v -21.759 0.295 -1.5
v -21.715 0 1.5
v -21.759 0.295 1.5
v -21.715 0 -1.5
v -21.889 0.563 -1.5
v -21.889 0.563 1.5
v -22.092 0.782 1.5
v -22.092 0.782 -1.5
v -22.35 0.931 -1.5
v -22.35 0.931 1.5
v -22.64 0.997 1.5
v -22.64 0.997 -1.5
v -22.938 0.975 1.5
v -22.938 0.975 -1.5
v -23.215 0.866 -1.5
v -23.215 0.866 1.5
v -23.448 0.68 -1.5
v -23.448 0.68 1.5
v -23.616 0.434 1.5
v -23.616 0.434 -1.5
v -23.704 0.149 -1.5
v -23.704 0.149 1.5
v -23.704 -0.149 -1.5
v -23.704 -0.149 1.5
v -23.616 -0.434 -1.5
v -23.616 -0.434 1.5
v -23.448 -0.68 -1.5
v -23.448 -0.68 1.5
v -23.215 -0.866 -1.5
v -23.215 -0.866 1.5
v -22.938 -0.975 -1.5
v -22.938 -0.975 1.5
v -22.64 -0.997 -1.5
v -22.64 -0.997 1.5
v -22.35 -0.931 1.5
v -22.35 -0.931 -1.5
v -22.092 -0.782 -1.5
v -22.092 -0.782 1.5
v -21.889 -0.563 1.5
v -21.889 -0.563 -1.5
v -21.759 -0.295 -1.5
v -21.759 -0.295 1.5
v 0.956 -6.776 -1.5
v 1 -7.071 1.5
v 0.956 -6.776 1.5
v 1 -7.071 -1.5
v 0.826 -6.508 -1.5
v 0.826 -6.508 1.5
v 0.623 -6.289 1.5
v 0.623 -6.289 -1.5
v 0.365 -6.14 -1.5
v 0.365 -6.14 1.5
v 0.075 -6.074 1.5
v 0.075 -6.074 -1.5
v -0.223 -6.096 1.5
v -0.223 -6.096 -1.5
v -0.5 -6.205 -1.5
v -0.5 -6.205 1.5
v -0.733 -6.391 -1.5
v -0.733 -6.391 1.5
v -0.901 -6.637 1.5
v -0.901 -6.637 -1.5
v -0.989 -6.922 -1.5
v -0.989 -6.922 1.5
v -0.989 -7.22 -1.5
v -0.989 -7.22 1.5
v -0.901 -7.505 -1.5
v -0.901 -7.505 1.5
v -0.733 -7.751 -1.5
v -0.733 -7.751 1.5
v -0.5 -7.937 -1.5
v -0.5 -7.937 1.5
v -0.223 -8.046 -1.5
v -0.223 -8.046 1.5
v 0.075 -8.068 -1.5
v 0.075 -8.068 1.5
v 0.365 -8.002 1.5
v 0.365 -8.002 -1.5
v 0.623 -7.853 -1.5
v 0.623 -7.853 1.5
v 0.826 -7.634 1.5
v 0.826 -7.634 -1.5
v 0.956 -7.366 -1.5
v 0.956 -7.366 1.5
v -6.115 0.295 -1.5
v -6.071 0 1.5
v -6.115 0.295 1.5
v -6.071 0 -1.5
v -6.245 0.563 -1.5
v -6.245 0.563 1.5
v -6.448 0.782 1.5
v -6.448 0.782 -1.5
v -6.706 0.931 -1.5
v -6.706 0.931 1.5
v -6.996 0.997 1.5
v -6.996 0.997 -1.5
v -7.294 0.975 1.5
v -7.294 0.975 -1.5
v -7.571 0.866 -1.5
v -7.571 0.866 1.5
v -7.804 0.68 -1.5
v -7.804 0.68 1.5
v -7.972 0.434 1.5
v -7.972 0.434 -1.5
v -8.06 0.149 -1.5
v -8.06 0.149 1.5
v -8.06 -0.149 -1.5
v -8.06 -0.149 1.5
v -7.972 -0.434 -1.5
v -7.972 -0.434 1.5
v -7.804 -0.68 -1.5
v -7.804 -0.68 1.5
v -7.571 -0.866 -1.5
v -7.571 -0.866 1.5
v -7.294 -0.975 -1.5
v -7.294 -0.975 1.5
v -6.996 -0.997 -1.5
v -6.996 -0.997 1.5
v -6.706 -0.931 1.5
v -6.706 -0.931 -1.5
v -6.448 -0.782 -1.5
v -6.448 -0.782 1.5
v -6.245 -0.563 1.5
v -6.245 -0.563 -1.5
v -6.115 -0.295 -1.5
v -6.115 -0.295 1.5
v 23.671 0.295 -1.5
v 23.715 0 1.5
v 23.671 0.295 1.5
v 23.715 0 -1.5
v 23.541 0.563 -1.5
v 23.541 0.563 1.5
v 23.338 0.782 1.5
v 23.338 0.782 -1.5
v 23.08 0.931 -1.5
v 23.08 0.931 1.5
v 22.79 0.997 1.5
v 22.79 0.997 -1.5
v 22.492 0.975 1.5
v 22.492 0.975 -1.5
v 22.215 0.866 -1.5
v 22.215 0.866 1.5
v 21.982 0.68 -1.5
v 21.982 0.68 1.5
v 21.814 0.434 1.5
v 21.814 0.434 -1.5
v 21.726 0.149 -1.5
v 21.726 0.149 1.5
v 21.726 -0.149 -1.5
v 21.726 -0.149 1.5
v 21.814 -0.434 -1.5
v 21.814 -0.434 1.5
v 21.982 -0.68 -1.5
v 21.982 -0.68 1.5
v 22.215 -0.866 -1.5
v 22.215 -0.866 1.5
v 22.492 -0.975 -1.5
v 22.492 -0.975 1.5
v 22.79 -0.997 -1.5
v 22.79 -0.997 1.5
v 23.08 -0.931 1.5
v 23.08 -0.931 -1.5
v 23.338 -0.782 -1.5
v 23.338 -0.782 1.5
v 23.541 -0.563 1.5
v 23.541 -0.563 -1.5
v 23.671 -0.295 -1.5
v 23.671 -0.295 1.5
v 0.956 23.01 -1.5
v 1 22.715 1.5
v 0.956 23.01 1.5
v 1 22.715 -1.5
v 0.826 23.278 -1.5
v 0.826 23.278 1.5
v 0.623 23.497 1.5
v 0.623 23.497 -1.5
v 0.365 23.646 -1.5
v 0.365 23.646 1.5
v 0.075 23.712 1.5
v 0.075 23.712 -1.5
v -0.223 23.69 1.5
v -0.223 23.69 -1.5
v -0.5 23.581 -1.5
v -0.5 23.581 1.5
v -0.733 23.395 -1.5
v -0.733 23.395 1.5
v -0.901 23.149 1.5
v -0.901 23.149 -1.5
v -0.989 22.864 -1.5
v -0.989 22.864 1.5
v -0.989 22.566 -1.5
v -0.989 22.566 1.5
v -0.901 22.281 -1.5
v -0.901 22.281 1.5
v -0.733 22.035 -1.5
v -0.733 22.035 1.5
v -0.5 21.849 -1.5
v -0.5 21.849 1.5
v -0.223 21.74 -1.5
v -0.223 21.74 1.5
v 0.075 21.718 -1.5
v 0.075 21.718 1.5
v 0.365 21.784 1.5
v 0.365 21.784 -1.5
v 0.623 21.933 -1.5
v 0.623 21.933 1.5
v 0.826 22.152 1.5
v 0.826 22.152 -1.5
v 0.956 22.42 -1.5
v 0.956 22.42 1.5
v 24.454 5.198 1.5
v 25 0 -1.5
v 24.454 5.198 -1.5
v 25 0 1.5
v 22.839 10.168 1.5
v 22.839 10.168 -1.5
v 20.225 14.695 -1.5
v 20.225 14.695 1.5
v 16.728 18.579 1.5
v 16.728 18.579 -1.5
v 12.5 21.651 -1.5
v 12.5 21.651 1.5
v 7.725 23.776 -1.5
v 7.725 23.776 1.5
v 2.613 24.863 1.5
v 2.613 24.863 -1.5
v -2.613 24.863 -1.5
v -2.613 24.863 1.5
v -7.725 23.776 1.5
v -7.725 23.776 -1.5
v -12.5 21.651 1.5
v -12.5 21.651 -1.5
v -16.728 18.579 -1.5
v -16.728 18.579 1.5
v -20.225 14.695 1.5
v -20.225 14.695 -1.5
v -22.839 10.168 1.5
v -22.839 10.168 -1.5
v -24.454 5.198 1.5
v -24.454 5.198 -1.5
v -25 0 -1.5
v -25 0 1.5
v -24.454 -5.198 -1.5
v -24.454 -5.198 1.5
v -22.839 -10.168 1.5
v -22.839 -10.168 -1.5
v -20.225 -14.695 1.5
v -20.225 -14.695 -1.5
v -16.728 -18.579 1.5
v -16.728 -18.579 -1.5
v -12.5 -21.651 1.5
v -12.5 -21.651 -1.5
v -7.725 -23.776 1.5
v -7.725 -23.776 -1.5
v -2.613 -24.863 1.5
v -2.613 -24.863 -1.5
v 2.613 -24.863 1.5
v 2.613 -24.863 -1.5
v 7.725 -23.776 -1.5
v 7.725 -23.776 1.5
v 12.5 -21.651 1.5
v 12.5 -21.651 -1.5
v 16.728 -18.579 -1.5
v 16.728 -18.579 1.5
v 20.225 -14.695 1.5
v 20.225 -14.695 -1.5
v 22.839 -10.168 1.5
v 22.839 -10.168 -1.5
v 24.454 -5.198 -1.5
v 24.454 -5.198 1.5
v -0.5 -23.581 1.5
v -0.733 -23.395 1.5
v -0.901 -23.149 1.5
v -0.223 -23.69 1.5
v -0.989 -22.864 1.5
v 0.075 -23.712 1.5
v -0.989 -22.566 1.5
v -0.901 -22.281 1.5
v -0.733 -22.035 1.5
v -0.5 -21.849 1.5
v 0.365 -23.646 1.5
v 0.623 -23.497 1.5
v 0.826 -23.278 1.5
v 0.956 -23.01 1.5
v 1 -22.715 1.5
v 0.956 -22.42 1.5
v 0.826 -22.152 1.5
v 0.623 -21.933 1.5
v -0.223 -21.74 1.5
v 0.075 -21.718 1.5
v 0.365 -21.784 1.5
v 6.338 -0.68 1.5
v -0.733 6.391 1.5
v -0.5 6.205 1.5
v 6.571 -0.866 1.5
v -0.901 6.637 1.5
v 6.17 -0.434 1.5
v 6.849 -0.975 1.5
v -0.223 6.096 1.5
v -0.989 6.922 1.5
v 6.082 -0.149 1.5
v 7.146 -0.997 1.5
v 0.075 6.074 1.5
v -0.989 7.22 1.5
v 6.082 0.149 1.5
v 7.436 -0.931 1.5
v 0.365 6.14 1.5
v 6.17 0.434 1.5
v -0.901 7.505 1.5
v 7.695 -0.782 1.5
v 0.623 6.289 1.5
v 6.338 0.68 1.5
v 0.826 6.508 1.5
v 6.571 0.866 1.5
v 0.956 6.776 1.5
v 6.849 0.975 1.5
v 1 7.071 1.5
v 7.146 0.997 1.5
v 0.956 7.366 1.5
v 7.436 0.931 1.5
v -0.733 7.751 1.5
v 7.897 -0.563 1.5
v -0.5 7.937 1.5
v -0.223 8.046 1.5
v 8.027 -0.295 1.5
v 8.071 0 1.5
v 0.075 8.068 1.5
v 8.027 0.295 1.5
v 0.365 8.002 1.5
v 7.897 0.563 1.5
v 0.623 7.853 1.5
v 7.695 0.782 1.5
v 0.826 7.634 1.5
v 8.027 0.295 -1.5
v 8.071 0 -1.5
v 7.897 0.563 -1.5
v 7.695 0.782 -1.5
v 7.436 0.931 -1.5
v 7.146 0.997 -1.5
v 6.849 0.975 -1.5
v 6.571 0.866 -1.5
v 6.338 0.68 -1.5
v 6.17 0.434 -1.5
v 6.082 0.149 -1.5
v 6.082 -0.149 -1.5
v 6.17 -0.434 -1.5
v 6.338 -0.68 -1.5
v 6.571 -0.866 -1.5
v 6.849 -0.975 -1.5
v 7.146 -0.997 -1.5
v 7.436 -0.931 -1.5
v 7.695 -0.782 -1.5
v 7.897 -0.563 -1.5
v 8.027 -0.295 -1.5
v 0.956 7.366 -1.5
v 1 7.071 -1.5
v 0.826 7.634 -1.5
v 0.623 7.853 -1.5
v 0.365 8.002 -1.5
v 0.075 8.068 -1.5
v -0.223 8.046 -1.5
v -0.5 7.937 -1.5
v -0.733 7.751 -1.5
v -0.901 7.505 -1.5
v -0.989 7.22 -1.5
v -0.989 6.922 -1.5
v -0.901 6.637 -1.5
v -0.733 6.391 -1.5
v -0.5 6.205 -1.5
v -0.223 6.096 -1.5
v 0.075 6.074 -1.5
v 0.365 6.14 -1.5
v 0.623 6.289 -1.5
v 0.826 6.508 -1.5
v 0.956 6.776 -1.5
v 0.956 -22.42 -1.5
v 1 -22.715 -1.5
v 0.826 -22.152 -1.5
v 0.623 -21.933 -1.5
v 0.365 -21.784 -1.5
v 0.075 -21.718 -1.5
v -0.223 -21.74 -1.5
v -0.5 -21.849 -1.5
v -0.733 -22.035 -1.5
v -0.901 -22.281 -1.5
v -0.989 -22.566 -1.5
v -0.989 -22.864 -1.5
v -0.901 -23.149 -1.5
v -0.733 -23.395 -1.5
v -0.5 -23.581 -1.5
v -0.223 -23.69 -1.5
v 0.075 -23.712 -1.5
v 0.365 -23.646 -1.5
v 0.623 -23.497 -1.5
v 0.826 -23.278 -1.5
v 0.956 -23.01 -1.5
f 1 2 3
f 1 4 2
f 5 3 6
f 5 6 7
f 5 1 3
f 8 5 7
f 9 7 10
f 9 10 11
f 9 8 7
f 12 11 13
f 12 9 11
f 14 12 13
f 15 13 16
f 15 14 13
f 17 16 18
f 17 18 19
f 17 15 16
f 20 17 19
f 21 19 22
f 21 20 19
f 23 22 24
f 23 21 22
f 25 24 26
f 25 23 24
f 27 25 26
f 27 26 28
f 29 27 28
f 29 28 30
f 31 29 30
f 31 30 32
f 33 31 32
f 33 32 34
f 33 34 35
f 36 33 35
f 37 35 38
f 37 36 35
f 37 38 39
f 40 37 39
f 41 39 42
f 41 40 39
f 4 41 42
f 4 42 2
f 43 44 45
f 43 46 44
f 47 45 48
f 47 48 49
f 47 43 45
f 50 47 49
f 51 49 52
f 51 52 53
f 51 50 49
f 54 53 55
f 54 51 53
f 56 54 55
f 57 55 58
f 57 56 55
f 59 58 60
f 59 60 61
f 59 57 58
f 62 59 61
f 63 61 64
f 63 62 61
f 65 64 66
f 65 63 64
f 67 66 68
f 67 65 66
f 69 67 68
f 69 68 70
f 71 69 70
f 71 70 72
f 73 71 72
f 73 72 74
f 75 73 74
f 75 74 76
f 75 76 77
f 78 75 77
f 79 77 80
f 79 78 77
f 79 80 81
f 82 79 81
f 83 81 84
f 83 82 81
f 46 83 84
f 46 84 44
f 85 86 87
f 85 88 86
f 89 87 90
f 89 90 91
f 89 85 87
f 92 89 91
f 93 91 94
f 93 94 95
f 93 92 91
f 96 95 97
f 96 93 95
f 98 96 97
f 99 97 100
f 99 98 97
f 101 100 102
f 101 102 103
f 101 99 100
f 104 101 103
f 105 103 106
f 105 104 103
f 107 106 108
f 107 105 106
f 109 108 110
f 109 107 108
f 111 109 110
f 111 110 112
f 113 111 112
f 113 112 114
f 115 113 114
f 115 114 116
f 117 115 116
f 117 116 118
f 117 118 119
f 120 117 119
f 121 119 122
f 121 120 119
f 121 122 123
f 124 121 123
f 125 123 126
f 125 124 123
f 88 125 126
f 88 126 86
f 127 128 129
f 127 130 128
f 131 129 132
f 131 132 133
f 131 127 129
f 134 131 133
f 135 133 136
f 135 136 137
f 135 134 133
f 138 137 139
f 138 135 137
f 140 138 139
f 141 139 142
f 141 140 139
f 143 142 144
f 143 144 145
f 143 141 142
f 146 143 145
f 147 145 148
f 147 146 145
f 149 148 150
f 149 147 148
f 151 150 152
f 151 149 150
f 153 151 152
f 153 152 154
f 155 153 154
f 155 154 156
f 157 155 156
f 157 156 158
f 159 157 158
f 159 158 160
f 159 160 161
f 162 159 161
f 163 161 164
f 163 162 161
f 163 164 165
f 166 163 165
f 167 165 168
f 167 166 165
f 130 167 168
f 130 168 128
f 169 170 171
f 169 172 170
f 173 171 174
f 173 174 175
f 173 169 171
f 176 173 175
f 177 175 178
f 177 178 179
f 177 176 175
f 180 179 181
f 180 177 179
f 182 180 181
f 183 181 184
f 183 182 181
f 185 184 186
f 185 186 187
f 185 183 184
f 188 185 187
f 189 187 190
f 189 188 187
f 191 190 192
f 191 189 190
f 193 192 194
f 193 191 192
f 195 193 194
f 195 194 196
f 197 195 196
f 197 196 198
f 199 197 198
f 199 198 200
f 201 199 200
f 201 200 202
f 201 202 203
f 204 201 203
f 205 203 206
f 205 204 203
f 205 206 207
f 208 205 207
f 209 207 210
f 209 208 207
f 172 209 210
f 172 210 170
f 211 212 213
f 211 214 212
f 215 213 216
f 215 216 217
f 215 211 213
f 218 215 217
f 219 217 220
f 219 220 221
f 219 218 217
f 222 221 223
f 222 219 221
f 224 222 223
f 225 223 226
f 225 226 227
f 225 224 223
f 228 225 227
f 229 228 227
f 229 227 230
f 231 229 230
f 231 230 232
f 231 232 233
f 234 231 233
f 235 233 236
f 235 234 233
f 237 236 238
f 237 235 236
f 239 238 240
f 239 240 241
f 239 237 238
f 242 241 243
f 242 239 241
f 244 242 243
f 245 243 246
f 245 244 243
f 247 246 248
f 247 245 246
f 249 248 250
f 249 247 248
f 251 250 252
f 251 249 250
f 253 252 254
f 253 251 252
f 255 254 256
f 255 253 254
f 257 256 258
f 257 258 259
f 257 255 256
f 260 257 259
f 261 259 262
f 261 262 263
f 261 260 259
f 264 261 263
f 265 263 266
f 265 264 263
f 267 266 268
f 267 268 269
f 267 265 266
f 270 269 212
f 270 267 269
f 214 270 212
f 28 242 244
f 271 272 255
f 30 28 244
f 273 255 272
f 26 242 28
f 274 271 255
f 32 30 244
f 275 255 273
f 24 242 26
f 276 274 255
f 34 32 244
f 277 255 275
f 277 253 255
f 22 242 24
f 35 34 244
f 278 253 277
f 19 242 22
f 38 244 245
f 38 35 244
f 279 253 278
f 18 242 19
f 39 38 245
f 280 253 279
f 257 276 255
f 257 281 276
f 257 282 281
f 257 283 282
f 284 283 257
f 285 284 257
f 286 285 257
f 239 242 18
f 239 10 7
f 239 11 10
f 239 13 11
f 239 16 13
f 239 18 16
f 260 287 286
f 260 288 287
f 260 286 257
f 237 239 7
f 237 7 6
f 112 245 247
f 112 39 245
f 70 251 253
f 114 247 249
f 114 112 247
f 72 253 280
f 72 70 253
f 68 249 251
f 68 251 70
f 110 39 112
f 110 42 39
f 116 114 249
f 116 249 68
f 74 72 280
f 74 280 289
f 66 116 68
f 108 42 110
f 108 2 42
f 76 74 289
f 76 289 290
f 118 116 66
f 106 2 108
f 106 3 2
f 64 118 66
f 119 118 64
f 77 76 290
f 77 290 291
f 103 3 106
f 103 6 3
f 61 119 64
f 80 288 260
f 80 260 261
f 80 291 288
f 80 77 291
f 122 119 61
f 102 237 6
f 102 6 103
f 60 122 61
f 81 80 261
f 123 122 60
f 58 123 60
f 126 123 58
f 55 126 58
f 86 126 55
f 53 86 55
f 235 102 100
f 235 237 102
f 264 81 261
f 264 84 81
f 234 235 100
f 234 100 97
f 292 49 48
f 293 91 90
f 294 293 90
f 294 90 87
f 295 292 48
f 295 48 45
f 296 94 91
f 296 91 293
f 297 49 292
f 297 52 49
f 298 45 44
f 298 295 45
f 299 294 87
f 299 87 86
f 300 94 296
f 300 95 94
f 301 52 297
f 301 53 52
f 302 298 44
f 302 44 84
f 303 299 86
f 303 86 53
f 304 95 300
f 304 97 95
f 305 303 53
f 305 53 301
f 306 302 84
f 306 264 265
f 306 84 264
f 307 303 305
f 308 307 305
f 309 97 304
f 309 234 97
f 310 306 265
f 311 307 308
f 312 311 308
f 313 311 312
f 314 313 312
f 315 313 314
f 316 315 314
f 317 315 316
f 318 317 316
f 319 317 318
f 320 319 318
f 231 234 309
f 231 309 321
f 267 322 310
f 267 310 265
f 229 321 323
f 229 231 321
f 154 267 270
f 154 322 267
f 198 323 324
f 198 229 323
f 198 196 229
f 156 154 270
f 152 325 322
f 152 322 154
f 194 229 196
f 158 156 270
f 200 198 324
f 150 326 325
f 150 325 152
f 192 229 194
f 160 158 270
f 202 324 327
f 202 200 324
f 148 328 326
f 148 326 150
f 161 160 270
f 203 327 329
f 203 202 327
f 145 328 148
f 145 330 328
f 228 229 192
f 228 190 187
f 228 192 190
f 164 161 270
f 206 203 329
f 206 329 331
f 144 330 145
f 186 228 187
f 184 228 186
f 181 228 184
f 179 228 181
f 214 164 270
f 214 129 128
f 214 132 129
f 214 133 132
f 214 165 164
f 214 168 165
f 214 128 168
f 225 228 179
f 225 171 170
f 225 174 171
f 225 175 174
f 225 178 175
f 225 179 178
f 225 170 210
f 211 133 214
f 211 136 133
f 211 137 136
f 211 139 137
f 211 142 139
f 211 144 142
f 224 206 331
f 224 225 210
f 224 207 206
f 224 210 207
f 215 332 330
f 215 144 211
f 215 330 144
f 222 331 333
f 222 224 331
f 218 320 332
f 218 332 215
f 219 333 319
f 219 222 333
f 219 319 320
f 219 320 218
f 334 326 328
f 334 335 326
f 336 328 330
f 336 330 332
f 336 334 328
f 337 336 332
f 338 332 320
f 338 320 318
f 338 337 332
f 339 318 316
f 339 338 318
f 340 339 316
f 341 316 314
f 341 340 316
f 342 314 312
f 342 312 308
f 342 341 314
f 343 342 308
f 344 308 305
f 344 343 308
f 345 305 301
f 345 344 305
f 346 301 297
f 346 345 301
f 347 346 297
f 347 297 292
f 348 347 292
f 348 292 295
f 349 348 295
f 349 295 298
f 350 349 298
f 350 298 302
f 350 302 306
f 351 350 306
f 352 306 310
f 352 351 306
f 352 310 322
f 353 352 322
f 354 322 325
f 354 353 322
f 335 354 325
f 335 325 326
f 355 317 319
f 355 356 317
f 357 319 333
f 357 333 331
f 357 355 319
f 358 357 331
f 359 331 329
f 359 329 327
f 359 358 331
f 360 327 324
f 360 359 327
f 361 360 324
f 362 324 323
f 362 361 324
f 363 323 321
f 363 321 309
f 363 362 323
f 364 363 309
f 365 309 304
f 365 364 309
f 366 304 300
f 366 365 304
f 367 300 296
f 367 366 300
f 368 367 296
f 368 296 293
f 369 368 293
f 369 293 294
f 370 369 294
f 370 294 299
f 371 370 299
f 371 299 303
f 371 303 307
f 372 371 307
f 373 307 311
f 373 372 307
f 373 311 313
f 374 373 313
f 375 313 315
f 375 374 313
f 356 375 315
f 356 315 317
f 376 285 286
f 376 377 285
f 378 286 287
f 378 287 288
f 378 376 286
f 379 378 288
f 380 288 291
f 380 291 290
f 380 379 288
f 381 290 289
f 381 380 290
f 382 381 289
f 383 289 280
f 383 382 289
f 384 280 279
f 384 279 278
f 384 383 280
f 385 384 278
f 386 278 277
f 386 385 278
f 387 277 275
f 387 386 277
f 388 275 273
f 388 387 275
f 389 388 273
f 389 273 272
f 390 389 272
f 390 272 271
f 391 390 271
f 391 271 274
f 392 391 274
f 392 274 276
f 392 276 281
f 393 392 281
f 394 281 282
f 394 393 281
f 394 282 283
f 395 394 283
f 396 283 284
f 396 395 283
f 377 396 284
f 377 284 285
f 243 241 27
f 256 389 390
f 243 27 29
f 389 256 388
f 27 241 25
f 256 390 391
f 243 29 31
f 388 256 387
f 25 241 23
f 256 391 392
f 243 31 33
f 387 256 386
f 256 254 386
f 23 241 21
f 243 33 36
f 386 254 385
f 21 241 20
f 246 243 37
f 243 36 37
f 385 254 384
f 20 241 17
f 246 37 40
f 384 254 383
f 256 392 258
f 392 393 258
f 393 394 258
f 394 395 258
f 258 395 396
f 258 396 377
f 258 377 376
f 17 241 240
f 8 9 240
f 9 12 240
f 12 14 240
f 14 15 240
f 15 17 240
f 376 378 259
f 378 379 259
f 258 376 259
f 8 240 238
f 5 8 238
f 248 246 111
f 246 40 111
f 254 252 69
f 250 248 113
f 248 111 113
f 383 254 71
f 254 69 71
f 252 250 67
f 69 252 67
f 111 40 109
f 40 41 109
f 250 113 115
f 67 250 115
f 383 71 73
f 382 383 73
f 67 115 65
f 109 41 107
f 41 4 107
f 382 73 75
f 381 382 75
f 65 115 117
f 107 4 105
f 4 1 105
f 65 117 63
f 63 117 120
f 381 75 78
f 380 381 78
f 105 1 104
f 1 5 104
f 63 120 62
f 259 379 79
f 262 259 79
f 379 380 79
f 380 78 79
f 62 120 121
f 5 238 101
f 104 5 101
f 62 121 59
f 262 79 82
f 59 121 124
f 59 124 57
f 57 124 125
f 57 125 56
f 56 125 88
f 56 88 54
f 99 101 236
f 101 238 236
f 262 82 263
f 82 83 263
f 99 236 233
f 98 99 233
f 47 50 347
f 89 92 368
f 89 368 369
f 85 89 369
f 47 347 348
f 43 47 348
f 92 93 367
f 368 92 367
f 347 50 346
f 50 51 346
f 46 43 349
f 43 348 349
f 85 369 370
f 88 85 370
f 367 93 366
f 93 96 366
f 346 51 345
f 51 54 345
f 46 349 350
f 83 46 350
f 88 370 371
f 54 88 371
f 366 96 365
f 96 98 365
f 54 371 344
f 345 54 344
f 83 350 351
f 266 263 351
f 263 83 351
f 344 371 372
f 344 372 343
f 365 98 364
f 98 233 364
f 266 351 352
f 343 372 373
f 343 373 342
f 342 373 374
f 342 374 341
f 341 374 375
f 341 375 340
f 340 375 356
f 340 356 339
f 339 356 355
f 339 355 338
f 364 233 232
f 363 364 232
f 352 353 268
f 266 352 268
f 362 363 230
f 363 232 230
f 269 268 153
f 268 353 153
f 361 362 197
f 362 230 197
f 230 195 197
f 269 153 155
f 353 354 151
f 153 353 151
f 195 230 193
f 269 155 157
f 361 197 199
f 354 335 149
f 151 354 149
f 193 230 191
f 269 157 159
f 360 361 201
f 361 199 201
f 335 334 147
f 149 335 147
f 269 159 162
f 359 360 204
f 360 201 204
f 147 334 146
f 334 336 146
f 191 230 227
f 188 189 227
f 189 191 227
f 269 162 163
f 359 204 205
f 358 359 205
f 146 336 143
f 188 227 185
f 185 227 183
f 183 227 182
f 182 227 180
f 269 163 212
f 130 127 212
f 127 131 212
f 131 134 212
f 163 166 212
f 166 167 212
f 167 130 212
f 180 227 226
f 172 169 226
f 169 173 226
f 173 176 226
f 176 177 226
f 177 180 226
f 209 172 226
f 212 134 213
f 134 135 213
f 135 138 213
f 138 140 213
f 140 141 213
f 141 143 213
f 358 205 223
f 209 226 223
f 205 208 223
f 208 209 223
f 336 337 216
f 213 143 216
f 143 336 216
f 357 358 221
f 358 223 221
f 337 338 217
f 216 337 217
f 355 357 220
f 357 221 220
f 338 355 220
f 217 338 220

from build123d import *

# Parameters (mm, degrees)
SKETCH1_R           = 25
SKETCH1_R_2         = 1
BOSS_EXTRUDE1_DEPTH = 1.5


with BuildPart() as part:
    # Sketch1 → Boss-Extrude1 (new, symmetric)
    with BuildSketch(Plane.XY):
        Circle(SKETCH1_R)
        with Locations((0, 22.715)):
            Circle(SKETCH1_R_2, mode=Mode.SUBTRACT)
        with Locations((0, 7.071067812)):
            Circle(SKETCH1_R_2, mode=Mode.SUBTRACT)
        with Locations((7.071067812, 0)):
            Circle(SKETCH1_R_2, mode=Mode.SUBTRACT)
        with Locations((0, -7.071067812)):
            Circle(SKETCH1_R_2, mode=Mode.SUBTRACT)
        with Locations((-7.071067812, 0)):
            Circle(SKETCH1_R_2, mode=Mode.SUBTRACT)
        with Locations((22.715, 0)):
            Circle(SKETCH1_R_2, mode=Mode.SUBTRACT)
        with Locations((0, -22.715)):
            Circle(SKETCH1_R_2, mode=Mode.SUBTRACT)
        with Locations((-22.715, 0)):
            Circle(SKETCH1_R_2, mode=Mode.SUBTRACT)
    extrude(amount=BOSS_EXTRUDE1_DEPTH, both=True)


solid = part.part
